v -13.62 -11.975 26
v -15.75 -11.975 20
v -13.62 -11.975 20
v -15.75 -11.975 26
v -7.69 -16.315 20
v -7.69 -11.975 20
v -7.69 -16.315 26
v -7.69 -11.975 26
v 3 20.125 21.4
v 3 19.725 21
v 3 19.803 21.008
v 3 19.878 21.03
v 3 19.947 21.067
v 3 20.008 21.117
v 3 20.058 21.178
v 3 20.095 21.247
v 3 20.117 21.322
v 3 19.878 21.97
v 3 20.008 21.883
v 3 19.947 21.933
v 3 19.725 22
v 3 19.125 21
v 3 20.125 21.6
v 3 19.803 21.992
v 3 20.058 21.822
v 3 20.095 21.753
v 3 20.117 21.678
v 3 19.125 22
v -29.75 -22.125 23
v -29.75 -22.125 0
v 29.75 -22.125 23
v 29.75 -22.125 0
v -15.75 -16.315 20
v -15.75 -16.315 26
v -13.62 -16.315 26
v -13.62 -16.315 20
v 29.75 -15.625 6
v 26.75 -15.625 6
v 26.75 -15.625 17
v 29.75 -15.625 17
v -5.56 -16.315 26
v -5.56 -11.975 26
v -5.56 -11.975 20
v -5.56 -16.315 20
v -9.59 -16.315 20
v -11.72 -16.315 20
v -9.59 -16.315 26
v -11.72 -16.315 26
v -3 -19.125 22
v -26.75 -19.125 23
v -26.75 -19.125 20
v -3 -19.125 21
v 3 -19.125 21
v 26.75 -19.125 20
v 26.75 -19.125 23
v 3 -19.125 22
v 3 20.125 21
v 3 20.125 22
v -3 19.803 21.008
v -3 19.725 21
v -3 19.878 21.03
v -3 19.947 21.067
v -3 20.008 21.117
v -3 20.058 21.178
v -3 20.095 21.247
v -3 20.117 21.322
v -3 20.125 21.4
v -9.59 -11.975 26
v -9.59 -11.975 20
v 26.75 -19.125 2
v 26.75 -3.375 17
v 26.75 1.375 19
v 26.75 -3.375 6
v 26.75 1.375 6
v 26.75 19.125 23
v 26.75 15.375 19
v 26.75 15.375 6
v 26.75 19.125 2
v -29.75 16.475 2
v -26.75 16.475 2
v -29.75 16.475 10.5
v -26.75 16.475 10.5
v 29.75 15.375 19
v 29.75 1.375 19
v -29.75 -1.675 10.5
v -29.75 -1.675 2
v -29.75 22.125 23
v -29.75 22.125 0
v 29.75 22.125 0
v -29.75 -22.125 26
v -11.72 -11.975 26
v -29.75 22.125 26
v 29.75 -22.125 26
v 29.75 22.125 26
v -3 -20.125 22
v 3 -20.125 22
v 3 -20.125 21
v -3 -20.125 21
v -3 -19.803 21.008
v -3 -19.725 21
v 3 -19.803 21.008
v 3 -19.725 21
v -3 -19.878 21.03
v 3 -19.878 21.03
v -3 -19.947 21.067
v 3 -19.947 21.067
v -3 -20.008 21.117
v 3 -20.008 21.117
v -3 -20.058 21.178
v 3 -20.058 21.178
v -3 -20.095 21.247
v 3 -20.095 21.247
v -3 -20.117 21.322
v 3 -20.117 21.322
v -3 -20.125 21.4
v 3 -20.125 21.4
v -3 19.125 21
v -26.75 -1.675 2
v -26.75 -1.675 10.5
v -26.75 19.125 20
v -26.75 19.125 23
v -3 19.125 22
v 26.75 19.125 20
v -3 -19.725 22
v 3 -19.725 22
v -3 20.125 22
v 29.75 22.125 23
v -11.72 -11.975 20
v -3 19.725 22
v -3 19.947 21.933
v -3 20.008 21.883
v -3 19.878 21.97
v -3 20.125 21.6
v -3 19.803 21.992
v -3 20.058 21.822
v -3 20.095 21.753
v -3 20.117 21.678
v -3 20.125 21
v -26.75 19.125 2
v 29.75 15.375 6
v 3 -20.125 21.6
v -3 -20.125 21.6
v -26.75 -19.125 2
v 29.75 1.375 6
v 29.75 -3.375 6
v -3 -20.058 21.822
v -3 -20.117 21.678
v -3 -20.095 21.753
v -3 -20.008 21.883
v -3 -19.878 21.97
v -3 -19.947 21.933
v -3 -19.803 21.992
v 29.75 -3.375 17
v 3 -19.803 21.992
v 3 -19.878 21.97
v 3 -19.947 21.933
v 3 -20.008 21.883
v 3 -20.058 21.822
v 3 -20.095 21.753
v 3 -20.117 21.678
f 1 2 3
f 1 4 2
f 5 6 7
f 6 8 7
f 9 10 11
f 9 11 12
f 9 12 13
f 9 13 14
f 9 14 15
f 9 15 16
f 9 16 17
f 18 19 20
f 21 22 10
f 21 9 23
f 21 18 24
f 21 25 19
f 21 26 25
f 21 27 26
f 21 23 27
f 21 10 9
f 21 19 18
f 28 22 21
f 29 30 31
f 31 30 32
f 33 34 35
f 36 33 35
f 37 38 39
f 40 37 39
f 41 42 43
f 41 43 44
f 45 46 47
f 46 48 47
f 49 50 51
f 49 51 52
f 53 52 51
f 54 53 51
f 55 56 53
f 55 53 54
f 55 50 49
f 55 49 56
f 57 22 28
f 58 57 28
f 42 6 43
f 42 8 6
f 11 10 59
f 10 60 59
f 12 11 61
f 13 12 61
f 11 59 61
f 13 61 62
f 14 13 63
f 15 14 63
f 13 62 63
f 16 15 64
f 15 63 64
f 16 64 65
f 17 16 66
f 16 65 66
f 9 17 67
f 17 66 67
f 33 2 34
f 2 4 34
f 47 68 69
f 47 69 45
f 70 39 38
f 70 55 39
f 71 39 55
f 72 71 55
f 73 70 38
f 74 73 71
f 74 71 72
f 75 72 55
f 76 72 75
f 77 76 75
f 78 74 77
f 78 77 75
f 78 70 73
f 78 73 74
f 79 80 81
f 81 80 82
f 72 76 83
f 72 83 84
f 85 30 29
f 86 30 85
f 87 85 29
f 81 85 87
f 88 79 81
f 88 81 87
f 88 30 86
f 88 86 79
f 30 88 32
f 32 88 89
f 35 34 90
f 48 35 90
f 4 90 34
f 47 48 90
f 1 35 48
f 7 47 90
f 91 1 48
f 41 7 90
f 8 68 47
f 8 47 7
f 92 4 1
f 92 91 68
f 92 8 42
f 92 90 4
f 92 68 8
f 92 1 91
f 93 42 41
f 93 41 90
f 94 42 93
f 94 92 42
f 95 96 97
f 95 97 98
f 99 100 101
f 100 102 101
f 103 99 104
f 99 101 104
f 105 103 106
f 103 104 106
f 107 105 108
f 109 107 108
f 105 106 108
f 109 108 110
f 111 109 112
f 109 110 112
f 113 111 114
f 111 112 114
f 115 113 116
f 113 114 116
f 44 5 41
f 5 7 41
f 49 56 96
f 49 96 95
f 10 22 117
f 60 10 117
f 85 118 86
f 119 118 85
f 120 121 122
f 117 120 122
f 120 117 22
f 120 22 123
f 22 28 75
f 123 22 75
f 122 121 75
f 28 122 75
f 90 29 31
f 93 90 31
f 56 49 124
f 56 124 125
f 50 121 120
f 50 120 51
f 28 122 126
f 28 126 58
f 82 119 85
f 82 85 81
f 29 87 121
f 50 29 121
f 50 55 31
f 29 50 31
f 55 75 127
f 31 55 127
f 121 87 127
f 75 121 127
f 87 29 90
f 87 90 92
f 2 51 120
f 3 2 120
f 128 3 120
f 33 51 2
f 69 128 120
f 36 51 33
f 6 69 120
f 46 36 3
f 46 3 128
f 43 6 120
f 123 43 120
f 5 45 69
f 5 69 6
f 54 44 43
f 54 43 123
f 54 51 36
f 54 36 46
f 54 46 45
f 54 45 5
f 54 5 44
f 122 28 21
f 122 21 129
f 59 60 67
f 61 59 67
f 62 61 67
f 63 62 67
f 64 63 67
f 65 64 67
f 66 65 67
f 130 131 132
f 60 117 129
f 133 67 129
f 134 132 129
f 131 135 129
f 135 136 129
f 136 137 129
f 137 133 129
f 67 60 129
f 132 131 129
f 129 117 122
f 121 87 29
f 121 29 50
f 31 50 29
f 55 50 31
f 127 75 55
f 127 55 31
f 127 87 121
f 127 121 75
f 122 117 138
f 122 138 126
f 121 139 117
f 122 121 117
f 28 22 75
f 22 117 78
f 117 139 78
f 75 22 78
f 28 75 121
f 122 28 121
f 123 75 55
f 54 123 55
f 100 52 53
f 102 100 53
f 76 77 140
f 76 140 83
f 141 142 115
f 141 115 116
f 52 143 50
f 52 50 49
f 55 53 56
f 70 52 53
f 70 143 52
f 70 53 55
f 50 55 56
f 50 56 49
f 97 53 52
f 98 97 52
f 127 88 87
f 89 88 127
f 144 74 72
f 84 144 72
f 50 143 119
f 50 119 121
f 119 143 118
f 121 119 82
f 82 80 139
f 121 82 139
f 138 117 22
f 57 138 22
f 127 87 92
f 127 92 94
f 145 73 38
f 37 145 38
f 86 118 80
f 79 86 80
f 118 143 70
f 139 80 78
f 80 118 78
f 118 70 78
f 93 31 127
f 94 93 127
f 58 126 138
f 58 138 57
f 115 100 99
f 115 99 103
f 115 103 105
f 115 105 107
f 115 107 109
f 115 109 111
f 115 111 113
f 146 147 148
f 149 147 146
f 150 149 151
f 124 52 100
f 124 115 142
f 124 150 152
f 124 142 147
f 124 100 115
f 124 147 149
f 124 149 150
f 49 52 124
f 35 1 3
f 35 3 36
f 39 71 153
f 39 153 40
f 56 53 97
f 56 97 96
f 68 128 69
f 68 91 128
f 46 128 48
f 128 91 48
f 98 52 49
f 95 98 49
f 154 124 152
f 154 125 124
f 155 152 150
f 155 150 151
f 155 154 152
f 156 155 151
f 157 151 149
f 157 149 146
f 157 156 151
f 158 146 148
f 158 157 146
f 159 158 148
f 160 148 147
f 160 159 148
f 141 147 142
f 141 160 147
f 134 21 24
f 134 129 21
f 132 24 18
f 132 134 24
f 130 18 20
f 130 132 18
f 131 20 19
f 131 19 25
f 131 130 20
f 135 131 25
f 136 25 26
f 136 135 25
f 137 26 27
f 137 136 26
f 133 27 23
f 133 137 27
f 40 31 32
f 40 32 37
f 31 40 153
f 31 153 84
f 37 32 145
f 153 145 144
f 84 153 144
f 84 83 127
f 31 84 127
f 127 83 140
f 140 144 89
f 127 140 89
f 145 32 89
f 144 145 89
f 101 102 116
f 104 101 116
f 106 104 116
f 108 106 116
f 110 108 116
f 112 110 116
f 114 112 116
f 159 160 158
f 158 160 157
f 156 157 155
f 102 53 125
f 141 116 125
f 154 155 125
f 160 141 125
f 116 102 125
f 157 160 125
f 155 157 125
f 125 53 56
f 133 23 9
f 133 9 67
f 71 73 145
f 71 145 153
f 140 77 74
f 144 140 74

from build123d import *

# Parameters (mm, degrees)
SKETCH001_W     = 59.5
SKETCH001_H     = 44.25
PAD_DEPTH       = 2
SKETCH002_W     = 59.5
SKETCH002_H     = 44.25
SKETCH002_W_2   = 53.5
SKETCH002_H_2   = 38.25
PAD001_DEPTH    = 21
SKETCH003_W     = 14
SKETCH003_H     = 13
POCKET_DEPTH    = 3
SKETCH004_W     = 12.25
SKETCH004_H     = 11
POCKET001_DEPTH = 3
SKETCH009_W     = 6
SKETCH009_H     = 1
POCKET002_DEPTH = 1
SKETCH010_W     = 6
SKETCH010_H     = 1
POCKET003_DEPTH = 1
SKETCH011_W     = 18.15
SKETCH011_H     = 8.5
POCKET004_DEPTH = 3
SKETCH005_W     = 59.5
SKETCH005_H     = 44.25
SKETCH005_W_2   = 2.13
SKETCH005_H_2   = 4.34
PAD002_DEPTH    = 3
SKETCH006_W     = 53.5
SKETCH006_H     = 38.25
SKETCH006_W_2   = 2.13
SKETCH006_H_2   = 4.34
PAD003_DEPTH    = 3
SKETCH007_W     = 6
SKETCH007_H     = 1
PAD004_DEPTH    = 1
SKETCH008_W     = 6
SKETCH008_H     = 1
PAD005_DEPTH    = 1
FILLET_R        = 0.4


with BuildPart() as body:
    # Sketch001 → Pad (new body)
    with BuildSketch(Plane.XY):
        Rectangle(SKETCH001_W, SKETCH001_H)
    extrude(amount=PAD_DEPTH)

    # Sketch002 (on Face6 of Pad) → Pad001 (join)
    with BuildSketch(Plane.XY.offset(2)):
        Rectangle(SKETCH002_W, SKETCH002_H)
        Rectangle(SKETCH002_W_2, SKETCH002_H_2, mode=Mode.SUBTRACT)
    extrude(amount=PAD001_DEPTH)

    # Sketch003 (on Face6 of Pad001) → Pocket (cut)
    with BuildSketch(Plane(origin=(26.75, 0, 0), x_dir=(0, -1, 0), z_dir=(-1, 0, 0))):
        with Locations((-8.375, 12.5)):
            Rectangle(SKETCH003_W, SKETCH003_H)
    extrude(amount=-POCKET_DEPTH, mode=Mode.SUBTRACT)

    # Sketch004 (on Face13 of Pocket) → Pocket001 (cut)
    with BuildSketch(Plane(origin=(26.75, 0, 0), x_dir=(0, -1, 0), z_dir=(-1, 0, 0))):
        with Locations((9.5, 11.5)):
            Rectangle(SKETCH004_W, SKETCH004_H)
    extrude(amount=-POCKET001_DEPTH, mode=Mode.SUBTRACT)

    # Sketch009 (on Face18 of Pocket001) → Pocket002 (cut)
    with BuildSketch(Plane.XZ.offset(-19.125)):
        with Locations((0, 21.5)):
            Rectangle(SKETCH009_W, SKETCH009_H)
    extrude(amount=-POCKET002_DEPTH, mode=Mode.SUBTRACT)

    # Sketch010 (on Face16 of Pocket002) → Pocket003 (cut)
    with BuildSketch(Plane(origin=(0, -19.125, 0), x_dir=(-1, 0, 0), z_dir=(0, 1, 0))):
        with Locations((0, 21.5)):
            Rectangle(SKETCH010_W, SKETCH010_H)
    extrude(amount=-POCKET003_DEPTH, mode=Mode.SUBTRACT)

    # Sketch011 (on Face15 of Pocket003) → Pocket004 (cut)
    with BuildSketch(Plane.YZ.offset(-26.75)):
        with Locations((7.4, 6.25)):
            Rectangle(SKETCH011_W, SKETCH011_H)
    extrude(amount=-POCKET004_DEPTH, mode=Mode.SUBTRACT)


with BuildPart() as lid:
    # Sketch005 (on DatumPlane) → Pad002 (new body)
    with BuildSketch(Plane.XY.offset(23)):
        Rectangle(SKETCH005_W, SKETCH005_H)
        with Locations((-14.685, -14.145)):
            Rectangle(SKETCH005_W_2, SKETCH005_H_2, mode=Mode.SUBTRACT)
        with Locations((-10.655, -14.145)):
            Rectangle(SKETCH005_W_2, SKETCH005_H_2, mode=Mode.SUBTRACT)
        with Locations((-6.625, -14.145)):
            Rectangle(SKETCH005_W_2, SKETCH005_H_2, mode=Mode.SUBTRACT)
    extrude(amount=PAD002_DEPTH)

    # Sketch006 (on Face17 of Pad002) → Pad003 (join)
    with BuildSketch(Plane(origin=(0, 0, 23), x_dir=(1, 0, 0), z_dir=(0, 0, -1))):
        Rectangle(SKETCH006_W, SKETCH006_H)
        with Locations((-6.625, 14.145)):
            Rectangle(SKETCH006_W_2, SKETCH006_H_2, mode=Mode.SUBTRACT)
        with Locations((-10.655, 14.145)):
            Rectangle(SKETCH006_W_2, SKETCH006_H_2, mode=Mode.SUBTRACT)
        with Locations((-14.685, 14.145)):
            Rectangle(SKETCH006_W_2, SKETCH006_H_2, mode=Mode.SUBTRACT)
    extrude(amount=PAD003_DEPTH)

    # Sketch007 (on Face10 of Pad003) → Pad004 (join)
    with BuildSketch(Plane(origin=(0, -19.125, 23), x_dir=(1, 0, 0), z_dir=(0, -1, 0))):
        with Locations((0, -1.5)):
            Rectangle(SKETCH007_W, SKETCH007_H)
    extrude(amount=PAD004_DEPTH)

    # Sketch008 (on Face8 of Pad004) → Pad005 (join)
    with BuildSketch(Plane(origin=(0, 19.125, 23), x_dir=(-1, 0, 0), z_dir=(0, 1, 0))):
        with Locations((0, -1.5)):
            Rectangle(SKETCH008_W, SKETCH008_H)
    extrude(amount=PAD005_DEPTH)

    # Fillet
    fillet_edges = [lid.edges().sort_by_distance(p)[0] for p in [
        (0, 20.125, 22),
        (0, 20.125, 21),
        (0, -20.125, 22),
        (0, -20.125, 21),
    ]]
    fillet(fillet_edges, radius=FILLET_R)


solid = Compound([body.part, lid.part])
